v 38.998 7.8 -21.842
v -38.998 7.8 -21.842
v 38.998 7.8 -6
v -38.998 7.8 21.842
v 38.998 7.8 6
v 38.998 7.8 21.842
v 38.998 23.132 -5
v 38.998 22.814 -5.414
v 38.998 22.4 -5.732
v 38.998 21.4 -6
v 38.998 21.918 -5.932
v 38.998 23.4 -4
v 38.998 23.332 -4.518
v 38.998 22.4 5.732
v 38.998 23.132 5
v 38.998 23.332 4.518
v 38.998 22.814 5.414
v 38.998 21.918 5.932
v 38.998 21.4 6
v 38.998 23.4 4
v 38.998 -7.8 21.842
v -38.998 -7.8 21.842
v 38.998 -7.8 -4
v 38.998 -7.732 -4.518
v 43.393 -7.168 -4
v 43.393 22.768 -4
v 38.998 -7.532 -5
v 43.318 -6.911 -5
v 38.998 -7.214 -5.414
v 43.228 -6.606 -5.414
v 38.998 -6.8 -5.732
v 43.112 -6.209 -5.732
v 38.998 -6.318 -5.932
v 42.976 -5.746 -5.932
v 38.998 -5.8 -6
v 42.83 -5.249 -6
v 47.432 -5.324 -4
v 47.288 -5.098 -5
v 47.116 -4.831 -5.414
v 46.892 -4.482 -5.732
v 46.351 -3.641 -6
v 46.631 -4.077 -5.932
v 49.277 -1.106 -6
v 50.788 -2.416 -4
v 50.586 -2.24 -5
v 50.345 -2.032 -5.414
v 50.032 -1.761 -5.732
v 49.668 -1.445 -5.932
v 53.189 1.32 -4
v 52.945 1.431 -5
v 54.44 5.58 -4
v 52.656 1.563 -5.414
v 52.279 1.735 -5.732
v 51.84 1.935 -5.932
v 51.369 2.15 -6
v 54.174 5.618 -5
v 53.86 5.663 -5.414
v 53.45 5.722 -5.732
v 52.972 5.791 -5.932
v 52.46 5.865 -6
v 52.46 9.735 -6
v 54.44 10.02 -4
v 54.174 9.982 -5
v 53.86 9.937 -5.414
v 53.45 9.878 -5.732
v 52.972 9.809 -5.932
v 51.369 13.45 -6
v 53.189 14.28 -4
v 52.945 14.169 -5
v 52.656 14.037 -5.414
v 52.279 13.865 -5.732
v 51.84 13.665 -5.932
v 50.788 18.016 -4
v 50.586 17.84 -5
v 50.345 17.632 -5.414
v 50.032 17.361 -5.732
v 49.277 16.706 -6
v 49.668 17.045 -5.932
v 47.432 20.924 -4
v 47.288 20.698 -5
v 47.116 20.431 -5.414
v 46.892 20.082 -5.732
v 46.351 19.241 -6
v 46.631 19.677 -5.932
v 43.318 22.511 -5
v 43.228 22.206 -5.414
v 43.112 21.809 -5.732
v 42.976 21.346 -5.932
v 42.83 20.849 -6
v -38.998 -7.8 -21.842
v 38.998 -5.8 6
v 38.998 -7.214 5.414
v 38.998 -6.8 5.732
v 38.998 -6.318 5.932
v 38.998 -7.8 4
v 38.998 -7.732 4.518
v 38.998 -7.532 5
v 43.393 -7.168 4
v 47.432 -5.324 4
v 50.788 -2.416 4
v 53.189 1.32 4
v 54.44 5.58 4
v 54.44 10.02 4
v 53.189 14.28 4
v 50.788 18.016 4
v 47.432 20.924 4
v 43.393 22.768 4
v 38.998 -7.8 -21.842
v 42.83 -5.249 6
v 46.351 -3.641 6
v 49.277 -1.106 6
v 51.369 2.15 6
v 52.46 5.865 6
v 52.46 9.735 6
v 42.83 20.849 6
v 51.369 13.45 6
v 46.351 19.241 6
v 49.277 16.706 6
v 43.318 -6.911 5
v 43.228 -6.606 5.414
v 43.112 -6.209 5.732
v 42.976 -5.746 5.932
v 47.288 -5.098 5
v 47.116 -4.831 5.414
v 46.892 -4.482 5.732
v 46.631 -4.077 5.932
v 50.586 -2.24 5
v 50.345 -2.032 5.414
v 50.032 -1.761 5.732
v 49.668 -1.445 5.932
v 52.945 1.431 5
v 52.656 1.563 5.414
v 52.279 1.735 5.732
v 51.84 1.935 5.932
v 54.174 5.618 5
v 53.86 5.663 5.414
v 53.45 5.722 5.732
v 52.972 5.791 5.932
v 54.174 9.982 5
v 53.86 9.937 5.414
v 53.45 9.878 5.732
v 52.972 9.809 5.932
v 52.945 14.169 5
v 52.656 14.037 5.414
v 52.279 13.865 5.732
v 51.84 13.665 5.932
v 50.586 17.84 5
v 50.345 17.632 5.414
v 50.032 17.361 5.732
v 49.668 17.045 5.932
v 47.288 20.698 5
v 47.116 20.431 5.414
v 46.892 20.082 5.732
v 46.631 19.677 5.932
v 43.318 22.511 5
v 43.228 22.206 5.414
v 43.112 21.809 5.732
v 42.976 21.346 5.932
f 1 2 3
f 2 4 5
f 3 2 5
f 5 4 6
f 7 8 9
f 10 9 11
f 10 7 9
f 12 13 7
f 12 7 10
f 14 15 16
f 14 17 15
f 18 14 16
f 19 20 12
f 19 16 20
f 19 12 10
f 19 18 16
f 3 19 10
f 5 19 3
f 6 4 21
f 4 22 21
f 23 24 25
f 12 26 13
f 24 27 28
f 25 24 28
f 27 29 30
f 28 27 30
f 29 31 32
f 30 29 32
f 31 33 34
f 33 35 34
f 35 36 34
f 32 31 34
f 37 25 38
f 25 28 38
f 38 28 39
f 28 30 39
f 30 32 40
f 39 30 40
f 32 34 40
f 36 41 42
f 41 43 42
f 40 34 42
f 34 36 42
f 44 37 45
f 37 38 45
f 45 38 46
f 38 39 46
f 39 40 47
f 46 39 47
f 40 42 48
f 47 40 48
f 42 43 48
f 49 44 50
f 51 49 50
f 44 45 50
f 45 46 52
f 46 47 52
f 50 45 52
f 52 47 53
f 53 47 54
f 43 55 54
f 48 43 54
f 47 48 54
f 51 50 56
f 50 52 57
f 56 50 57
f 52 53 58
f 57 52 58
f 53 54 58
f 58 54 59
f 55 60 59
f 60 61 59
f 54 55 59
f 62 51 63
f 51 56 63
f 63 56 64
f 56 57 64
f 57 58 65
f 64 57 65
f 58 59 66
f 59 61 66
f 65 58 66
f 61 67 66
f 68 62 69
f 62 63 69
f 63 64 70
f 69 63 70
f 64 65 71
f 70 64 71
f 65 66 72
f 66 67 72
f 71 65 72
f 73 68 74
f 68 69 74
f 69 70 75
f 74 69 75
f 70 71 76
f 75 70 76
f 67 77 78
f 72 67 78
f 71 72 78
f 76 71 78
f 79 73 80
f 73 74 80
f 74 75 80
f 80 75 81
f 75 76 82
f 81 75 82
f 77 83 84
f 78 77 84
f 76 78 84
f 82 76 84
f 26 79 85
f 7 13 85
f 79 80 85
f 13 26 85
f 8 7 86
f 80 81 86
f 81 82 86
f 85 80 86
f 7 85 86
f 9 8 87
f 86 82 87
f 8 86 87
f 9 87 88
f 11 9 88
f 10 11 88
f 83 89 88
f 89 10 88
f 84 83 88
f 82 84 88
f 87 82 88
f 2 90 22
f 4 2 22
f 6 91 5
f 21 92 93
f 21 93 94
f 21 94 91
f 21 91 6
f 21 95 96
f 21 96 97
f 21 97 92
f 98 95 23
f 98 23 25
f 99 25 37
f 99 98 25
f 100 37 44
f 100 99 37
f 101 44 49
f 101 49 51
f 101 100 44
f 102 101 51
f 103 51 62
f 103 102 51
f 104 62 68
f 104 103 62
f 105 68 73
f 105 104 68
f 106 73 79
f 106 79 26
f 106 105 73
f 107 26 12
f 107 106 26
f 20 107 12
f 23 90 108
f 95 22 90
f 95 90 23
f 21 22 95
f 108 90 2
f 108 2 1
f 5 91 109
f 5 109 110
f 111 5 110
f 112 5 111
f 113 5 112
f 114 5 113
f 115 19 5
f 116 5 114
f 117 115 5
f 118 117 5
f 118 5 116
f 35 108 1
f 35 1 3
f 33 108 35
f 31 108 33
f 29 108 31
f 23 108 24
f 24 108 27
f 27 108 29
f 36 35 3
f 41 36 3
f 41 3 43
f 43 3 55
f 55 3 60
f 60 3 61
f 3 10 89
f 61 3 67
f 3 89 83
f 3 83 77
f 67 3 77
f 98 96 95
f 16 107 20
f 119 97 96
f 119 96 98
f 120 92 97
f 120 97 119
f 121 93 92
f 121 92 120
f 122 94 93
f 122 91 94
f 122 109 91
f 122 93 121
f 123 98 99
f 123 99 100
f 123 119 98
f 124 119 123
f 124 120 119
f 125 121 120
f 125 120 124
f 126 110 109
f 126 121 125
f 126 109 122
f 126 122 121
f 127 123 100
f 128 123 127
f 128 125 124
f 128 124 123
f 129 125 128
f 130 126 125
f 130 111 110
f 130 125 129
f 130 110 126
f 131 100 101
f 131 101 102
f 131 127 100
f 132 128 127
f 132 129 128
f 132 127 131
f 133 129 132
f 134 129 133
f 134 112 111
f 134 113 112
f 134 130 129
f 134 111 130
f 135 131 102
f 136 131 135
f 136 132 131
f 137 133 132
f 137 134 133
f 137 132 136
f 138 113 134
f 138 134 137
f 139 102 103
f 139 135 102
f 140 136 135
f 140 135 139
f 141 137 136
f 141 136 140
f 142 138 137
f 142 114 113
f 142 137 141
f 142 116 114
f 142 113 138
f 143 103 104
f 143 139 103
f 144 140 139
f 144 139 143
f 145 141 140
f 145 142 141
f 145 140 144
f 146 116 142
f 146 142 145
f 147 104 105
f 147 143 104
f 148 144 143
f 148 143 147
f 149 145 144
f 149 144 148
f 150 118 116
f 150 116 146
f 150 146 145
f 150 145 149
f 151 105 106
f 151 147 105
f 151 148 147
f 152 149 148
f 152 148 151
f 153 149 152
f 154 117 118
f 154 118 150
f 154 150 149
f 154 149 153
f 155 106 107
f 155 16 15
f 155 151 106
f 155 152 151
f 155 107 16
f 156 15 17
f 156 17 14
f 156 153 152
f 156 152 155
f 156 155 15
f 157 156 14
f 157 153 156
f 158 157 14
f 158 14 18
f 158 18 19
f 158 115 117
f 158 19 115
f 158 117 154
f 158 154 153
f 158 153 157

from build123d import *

# Parameters (mm, degrees)
F0_W     = 77.996812
F0_H     = 43.68491
F1_DEPTH = 7.8
F3_DEPTH = 6
F4_R     = 2


with BuildPart() as f1:
    # F0 (on Front) → F1 (new body, symmetric)
    with BuildSketch(Plane.XZ):
        Rectangle(F0_W, F0_H)
    extrude(amount=F1_DEPTH, both=True)

    # F2 (on Top) → F3 (join, symmetric)
    with BuildSketch(Plane.XY):
        with BuildLine():
            Line((38.998406, 7.8), (38.998406, -7.8))
            ThreePointArc((38.998406, -7.8), (54.598406, 7.8), (38.998406, 23.4))
            Line((38.998406, 23.4), (38.998406, 7.8))
        make_face()
    extrude(amount=F3_DEPTH, both=True)

    # F4
    f4_edges = [f1.edges().sort_by_distance(p)[0] for p in [
        (54.598406, 7.8, 6),
        (54.598406, 7.8, -6),
    ]]
    fillet(f4_edges, radius=F4_R)


solid = f1.part
